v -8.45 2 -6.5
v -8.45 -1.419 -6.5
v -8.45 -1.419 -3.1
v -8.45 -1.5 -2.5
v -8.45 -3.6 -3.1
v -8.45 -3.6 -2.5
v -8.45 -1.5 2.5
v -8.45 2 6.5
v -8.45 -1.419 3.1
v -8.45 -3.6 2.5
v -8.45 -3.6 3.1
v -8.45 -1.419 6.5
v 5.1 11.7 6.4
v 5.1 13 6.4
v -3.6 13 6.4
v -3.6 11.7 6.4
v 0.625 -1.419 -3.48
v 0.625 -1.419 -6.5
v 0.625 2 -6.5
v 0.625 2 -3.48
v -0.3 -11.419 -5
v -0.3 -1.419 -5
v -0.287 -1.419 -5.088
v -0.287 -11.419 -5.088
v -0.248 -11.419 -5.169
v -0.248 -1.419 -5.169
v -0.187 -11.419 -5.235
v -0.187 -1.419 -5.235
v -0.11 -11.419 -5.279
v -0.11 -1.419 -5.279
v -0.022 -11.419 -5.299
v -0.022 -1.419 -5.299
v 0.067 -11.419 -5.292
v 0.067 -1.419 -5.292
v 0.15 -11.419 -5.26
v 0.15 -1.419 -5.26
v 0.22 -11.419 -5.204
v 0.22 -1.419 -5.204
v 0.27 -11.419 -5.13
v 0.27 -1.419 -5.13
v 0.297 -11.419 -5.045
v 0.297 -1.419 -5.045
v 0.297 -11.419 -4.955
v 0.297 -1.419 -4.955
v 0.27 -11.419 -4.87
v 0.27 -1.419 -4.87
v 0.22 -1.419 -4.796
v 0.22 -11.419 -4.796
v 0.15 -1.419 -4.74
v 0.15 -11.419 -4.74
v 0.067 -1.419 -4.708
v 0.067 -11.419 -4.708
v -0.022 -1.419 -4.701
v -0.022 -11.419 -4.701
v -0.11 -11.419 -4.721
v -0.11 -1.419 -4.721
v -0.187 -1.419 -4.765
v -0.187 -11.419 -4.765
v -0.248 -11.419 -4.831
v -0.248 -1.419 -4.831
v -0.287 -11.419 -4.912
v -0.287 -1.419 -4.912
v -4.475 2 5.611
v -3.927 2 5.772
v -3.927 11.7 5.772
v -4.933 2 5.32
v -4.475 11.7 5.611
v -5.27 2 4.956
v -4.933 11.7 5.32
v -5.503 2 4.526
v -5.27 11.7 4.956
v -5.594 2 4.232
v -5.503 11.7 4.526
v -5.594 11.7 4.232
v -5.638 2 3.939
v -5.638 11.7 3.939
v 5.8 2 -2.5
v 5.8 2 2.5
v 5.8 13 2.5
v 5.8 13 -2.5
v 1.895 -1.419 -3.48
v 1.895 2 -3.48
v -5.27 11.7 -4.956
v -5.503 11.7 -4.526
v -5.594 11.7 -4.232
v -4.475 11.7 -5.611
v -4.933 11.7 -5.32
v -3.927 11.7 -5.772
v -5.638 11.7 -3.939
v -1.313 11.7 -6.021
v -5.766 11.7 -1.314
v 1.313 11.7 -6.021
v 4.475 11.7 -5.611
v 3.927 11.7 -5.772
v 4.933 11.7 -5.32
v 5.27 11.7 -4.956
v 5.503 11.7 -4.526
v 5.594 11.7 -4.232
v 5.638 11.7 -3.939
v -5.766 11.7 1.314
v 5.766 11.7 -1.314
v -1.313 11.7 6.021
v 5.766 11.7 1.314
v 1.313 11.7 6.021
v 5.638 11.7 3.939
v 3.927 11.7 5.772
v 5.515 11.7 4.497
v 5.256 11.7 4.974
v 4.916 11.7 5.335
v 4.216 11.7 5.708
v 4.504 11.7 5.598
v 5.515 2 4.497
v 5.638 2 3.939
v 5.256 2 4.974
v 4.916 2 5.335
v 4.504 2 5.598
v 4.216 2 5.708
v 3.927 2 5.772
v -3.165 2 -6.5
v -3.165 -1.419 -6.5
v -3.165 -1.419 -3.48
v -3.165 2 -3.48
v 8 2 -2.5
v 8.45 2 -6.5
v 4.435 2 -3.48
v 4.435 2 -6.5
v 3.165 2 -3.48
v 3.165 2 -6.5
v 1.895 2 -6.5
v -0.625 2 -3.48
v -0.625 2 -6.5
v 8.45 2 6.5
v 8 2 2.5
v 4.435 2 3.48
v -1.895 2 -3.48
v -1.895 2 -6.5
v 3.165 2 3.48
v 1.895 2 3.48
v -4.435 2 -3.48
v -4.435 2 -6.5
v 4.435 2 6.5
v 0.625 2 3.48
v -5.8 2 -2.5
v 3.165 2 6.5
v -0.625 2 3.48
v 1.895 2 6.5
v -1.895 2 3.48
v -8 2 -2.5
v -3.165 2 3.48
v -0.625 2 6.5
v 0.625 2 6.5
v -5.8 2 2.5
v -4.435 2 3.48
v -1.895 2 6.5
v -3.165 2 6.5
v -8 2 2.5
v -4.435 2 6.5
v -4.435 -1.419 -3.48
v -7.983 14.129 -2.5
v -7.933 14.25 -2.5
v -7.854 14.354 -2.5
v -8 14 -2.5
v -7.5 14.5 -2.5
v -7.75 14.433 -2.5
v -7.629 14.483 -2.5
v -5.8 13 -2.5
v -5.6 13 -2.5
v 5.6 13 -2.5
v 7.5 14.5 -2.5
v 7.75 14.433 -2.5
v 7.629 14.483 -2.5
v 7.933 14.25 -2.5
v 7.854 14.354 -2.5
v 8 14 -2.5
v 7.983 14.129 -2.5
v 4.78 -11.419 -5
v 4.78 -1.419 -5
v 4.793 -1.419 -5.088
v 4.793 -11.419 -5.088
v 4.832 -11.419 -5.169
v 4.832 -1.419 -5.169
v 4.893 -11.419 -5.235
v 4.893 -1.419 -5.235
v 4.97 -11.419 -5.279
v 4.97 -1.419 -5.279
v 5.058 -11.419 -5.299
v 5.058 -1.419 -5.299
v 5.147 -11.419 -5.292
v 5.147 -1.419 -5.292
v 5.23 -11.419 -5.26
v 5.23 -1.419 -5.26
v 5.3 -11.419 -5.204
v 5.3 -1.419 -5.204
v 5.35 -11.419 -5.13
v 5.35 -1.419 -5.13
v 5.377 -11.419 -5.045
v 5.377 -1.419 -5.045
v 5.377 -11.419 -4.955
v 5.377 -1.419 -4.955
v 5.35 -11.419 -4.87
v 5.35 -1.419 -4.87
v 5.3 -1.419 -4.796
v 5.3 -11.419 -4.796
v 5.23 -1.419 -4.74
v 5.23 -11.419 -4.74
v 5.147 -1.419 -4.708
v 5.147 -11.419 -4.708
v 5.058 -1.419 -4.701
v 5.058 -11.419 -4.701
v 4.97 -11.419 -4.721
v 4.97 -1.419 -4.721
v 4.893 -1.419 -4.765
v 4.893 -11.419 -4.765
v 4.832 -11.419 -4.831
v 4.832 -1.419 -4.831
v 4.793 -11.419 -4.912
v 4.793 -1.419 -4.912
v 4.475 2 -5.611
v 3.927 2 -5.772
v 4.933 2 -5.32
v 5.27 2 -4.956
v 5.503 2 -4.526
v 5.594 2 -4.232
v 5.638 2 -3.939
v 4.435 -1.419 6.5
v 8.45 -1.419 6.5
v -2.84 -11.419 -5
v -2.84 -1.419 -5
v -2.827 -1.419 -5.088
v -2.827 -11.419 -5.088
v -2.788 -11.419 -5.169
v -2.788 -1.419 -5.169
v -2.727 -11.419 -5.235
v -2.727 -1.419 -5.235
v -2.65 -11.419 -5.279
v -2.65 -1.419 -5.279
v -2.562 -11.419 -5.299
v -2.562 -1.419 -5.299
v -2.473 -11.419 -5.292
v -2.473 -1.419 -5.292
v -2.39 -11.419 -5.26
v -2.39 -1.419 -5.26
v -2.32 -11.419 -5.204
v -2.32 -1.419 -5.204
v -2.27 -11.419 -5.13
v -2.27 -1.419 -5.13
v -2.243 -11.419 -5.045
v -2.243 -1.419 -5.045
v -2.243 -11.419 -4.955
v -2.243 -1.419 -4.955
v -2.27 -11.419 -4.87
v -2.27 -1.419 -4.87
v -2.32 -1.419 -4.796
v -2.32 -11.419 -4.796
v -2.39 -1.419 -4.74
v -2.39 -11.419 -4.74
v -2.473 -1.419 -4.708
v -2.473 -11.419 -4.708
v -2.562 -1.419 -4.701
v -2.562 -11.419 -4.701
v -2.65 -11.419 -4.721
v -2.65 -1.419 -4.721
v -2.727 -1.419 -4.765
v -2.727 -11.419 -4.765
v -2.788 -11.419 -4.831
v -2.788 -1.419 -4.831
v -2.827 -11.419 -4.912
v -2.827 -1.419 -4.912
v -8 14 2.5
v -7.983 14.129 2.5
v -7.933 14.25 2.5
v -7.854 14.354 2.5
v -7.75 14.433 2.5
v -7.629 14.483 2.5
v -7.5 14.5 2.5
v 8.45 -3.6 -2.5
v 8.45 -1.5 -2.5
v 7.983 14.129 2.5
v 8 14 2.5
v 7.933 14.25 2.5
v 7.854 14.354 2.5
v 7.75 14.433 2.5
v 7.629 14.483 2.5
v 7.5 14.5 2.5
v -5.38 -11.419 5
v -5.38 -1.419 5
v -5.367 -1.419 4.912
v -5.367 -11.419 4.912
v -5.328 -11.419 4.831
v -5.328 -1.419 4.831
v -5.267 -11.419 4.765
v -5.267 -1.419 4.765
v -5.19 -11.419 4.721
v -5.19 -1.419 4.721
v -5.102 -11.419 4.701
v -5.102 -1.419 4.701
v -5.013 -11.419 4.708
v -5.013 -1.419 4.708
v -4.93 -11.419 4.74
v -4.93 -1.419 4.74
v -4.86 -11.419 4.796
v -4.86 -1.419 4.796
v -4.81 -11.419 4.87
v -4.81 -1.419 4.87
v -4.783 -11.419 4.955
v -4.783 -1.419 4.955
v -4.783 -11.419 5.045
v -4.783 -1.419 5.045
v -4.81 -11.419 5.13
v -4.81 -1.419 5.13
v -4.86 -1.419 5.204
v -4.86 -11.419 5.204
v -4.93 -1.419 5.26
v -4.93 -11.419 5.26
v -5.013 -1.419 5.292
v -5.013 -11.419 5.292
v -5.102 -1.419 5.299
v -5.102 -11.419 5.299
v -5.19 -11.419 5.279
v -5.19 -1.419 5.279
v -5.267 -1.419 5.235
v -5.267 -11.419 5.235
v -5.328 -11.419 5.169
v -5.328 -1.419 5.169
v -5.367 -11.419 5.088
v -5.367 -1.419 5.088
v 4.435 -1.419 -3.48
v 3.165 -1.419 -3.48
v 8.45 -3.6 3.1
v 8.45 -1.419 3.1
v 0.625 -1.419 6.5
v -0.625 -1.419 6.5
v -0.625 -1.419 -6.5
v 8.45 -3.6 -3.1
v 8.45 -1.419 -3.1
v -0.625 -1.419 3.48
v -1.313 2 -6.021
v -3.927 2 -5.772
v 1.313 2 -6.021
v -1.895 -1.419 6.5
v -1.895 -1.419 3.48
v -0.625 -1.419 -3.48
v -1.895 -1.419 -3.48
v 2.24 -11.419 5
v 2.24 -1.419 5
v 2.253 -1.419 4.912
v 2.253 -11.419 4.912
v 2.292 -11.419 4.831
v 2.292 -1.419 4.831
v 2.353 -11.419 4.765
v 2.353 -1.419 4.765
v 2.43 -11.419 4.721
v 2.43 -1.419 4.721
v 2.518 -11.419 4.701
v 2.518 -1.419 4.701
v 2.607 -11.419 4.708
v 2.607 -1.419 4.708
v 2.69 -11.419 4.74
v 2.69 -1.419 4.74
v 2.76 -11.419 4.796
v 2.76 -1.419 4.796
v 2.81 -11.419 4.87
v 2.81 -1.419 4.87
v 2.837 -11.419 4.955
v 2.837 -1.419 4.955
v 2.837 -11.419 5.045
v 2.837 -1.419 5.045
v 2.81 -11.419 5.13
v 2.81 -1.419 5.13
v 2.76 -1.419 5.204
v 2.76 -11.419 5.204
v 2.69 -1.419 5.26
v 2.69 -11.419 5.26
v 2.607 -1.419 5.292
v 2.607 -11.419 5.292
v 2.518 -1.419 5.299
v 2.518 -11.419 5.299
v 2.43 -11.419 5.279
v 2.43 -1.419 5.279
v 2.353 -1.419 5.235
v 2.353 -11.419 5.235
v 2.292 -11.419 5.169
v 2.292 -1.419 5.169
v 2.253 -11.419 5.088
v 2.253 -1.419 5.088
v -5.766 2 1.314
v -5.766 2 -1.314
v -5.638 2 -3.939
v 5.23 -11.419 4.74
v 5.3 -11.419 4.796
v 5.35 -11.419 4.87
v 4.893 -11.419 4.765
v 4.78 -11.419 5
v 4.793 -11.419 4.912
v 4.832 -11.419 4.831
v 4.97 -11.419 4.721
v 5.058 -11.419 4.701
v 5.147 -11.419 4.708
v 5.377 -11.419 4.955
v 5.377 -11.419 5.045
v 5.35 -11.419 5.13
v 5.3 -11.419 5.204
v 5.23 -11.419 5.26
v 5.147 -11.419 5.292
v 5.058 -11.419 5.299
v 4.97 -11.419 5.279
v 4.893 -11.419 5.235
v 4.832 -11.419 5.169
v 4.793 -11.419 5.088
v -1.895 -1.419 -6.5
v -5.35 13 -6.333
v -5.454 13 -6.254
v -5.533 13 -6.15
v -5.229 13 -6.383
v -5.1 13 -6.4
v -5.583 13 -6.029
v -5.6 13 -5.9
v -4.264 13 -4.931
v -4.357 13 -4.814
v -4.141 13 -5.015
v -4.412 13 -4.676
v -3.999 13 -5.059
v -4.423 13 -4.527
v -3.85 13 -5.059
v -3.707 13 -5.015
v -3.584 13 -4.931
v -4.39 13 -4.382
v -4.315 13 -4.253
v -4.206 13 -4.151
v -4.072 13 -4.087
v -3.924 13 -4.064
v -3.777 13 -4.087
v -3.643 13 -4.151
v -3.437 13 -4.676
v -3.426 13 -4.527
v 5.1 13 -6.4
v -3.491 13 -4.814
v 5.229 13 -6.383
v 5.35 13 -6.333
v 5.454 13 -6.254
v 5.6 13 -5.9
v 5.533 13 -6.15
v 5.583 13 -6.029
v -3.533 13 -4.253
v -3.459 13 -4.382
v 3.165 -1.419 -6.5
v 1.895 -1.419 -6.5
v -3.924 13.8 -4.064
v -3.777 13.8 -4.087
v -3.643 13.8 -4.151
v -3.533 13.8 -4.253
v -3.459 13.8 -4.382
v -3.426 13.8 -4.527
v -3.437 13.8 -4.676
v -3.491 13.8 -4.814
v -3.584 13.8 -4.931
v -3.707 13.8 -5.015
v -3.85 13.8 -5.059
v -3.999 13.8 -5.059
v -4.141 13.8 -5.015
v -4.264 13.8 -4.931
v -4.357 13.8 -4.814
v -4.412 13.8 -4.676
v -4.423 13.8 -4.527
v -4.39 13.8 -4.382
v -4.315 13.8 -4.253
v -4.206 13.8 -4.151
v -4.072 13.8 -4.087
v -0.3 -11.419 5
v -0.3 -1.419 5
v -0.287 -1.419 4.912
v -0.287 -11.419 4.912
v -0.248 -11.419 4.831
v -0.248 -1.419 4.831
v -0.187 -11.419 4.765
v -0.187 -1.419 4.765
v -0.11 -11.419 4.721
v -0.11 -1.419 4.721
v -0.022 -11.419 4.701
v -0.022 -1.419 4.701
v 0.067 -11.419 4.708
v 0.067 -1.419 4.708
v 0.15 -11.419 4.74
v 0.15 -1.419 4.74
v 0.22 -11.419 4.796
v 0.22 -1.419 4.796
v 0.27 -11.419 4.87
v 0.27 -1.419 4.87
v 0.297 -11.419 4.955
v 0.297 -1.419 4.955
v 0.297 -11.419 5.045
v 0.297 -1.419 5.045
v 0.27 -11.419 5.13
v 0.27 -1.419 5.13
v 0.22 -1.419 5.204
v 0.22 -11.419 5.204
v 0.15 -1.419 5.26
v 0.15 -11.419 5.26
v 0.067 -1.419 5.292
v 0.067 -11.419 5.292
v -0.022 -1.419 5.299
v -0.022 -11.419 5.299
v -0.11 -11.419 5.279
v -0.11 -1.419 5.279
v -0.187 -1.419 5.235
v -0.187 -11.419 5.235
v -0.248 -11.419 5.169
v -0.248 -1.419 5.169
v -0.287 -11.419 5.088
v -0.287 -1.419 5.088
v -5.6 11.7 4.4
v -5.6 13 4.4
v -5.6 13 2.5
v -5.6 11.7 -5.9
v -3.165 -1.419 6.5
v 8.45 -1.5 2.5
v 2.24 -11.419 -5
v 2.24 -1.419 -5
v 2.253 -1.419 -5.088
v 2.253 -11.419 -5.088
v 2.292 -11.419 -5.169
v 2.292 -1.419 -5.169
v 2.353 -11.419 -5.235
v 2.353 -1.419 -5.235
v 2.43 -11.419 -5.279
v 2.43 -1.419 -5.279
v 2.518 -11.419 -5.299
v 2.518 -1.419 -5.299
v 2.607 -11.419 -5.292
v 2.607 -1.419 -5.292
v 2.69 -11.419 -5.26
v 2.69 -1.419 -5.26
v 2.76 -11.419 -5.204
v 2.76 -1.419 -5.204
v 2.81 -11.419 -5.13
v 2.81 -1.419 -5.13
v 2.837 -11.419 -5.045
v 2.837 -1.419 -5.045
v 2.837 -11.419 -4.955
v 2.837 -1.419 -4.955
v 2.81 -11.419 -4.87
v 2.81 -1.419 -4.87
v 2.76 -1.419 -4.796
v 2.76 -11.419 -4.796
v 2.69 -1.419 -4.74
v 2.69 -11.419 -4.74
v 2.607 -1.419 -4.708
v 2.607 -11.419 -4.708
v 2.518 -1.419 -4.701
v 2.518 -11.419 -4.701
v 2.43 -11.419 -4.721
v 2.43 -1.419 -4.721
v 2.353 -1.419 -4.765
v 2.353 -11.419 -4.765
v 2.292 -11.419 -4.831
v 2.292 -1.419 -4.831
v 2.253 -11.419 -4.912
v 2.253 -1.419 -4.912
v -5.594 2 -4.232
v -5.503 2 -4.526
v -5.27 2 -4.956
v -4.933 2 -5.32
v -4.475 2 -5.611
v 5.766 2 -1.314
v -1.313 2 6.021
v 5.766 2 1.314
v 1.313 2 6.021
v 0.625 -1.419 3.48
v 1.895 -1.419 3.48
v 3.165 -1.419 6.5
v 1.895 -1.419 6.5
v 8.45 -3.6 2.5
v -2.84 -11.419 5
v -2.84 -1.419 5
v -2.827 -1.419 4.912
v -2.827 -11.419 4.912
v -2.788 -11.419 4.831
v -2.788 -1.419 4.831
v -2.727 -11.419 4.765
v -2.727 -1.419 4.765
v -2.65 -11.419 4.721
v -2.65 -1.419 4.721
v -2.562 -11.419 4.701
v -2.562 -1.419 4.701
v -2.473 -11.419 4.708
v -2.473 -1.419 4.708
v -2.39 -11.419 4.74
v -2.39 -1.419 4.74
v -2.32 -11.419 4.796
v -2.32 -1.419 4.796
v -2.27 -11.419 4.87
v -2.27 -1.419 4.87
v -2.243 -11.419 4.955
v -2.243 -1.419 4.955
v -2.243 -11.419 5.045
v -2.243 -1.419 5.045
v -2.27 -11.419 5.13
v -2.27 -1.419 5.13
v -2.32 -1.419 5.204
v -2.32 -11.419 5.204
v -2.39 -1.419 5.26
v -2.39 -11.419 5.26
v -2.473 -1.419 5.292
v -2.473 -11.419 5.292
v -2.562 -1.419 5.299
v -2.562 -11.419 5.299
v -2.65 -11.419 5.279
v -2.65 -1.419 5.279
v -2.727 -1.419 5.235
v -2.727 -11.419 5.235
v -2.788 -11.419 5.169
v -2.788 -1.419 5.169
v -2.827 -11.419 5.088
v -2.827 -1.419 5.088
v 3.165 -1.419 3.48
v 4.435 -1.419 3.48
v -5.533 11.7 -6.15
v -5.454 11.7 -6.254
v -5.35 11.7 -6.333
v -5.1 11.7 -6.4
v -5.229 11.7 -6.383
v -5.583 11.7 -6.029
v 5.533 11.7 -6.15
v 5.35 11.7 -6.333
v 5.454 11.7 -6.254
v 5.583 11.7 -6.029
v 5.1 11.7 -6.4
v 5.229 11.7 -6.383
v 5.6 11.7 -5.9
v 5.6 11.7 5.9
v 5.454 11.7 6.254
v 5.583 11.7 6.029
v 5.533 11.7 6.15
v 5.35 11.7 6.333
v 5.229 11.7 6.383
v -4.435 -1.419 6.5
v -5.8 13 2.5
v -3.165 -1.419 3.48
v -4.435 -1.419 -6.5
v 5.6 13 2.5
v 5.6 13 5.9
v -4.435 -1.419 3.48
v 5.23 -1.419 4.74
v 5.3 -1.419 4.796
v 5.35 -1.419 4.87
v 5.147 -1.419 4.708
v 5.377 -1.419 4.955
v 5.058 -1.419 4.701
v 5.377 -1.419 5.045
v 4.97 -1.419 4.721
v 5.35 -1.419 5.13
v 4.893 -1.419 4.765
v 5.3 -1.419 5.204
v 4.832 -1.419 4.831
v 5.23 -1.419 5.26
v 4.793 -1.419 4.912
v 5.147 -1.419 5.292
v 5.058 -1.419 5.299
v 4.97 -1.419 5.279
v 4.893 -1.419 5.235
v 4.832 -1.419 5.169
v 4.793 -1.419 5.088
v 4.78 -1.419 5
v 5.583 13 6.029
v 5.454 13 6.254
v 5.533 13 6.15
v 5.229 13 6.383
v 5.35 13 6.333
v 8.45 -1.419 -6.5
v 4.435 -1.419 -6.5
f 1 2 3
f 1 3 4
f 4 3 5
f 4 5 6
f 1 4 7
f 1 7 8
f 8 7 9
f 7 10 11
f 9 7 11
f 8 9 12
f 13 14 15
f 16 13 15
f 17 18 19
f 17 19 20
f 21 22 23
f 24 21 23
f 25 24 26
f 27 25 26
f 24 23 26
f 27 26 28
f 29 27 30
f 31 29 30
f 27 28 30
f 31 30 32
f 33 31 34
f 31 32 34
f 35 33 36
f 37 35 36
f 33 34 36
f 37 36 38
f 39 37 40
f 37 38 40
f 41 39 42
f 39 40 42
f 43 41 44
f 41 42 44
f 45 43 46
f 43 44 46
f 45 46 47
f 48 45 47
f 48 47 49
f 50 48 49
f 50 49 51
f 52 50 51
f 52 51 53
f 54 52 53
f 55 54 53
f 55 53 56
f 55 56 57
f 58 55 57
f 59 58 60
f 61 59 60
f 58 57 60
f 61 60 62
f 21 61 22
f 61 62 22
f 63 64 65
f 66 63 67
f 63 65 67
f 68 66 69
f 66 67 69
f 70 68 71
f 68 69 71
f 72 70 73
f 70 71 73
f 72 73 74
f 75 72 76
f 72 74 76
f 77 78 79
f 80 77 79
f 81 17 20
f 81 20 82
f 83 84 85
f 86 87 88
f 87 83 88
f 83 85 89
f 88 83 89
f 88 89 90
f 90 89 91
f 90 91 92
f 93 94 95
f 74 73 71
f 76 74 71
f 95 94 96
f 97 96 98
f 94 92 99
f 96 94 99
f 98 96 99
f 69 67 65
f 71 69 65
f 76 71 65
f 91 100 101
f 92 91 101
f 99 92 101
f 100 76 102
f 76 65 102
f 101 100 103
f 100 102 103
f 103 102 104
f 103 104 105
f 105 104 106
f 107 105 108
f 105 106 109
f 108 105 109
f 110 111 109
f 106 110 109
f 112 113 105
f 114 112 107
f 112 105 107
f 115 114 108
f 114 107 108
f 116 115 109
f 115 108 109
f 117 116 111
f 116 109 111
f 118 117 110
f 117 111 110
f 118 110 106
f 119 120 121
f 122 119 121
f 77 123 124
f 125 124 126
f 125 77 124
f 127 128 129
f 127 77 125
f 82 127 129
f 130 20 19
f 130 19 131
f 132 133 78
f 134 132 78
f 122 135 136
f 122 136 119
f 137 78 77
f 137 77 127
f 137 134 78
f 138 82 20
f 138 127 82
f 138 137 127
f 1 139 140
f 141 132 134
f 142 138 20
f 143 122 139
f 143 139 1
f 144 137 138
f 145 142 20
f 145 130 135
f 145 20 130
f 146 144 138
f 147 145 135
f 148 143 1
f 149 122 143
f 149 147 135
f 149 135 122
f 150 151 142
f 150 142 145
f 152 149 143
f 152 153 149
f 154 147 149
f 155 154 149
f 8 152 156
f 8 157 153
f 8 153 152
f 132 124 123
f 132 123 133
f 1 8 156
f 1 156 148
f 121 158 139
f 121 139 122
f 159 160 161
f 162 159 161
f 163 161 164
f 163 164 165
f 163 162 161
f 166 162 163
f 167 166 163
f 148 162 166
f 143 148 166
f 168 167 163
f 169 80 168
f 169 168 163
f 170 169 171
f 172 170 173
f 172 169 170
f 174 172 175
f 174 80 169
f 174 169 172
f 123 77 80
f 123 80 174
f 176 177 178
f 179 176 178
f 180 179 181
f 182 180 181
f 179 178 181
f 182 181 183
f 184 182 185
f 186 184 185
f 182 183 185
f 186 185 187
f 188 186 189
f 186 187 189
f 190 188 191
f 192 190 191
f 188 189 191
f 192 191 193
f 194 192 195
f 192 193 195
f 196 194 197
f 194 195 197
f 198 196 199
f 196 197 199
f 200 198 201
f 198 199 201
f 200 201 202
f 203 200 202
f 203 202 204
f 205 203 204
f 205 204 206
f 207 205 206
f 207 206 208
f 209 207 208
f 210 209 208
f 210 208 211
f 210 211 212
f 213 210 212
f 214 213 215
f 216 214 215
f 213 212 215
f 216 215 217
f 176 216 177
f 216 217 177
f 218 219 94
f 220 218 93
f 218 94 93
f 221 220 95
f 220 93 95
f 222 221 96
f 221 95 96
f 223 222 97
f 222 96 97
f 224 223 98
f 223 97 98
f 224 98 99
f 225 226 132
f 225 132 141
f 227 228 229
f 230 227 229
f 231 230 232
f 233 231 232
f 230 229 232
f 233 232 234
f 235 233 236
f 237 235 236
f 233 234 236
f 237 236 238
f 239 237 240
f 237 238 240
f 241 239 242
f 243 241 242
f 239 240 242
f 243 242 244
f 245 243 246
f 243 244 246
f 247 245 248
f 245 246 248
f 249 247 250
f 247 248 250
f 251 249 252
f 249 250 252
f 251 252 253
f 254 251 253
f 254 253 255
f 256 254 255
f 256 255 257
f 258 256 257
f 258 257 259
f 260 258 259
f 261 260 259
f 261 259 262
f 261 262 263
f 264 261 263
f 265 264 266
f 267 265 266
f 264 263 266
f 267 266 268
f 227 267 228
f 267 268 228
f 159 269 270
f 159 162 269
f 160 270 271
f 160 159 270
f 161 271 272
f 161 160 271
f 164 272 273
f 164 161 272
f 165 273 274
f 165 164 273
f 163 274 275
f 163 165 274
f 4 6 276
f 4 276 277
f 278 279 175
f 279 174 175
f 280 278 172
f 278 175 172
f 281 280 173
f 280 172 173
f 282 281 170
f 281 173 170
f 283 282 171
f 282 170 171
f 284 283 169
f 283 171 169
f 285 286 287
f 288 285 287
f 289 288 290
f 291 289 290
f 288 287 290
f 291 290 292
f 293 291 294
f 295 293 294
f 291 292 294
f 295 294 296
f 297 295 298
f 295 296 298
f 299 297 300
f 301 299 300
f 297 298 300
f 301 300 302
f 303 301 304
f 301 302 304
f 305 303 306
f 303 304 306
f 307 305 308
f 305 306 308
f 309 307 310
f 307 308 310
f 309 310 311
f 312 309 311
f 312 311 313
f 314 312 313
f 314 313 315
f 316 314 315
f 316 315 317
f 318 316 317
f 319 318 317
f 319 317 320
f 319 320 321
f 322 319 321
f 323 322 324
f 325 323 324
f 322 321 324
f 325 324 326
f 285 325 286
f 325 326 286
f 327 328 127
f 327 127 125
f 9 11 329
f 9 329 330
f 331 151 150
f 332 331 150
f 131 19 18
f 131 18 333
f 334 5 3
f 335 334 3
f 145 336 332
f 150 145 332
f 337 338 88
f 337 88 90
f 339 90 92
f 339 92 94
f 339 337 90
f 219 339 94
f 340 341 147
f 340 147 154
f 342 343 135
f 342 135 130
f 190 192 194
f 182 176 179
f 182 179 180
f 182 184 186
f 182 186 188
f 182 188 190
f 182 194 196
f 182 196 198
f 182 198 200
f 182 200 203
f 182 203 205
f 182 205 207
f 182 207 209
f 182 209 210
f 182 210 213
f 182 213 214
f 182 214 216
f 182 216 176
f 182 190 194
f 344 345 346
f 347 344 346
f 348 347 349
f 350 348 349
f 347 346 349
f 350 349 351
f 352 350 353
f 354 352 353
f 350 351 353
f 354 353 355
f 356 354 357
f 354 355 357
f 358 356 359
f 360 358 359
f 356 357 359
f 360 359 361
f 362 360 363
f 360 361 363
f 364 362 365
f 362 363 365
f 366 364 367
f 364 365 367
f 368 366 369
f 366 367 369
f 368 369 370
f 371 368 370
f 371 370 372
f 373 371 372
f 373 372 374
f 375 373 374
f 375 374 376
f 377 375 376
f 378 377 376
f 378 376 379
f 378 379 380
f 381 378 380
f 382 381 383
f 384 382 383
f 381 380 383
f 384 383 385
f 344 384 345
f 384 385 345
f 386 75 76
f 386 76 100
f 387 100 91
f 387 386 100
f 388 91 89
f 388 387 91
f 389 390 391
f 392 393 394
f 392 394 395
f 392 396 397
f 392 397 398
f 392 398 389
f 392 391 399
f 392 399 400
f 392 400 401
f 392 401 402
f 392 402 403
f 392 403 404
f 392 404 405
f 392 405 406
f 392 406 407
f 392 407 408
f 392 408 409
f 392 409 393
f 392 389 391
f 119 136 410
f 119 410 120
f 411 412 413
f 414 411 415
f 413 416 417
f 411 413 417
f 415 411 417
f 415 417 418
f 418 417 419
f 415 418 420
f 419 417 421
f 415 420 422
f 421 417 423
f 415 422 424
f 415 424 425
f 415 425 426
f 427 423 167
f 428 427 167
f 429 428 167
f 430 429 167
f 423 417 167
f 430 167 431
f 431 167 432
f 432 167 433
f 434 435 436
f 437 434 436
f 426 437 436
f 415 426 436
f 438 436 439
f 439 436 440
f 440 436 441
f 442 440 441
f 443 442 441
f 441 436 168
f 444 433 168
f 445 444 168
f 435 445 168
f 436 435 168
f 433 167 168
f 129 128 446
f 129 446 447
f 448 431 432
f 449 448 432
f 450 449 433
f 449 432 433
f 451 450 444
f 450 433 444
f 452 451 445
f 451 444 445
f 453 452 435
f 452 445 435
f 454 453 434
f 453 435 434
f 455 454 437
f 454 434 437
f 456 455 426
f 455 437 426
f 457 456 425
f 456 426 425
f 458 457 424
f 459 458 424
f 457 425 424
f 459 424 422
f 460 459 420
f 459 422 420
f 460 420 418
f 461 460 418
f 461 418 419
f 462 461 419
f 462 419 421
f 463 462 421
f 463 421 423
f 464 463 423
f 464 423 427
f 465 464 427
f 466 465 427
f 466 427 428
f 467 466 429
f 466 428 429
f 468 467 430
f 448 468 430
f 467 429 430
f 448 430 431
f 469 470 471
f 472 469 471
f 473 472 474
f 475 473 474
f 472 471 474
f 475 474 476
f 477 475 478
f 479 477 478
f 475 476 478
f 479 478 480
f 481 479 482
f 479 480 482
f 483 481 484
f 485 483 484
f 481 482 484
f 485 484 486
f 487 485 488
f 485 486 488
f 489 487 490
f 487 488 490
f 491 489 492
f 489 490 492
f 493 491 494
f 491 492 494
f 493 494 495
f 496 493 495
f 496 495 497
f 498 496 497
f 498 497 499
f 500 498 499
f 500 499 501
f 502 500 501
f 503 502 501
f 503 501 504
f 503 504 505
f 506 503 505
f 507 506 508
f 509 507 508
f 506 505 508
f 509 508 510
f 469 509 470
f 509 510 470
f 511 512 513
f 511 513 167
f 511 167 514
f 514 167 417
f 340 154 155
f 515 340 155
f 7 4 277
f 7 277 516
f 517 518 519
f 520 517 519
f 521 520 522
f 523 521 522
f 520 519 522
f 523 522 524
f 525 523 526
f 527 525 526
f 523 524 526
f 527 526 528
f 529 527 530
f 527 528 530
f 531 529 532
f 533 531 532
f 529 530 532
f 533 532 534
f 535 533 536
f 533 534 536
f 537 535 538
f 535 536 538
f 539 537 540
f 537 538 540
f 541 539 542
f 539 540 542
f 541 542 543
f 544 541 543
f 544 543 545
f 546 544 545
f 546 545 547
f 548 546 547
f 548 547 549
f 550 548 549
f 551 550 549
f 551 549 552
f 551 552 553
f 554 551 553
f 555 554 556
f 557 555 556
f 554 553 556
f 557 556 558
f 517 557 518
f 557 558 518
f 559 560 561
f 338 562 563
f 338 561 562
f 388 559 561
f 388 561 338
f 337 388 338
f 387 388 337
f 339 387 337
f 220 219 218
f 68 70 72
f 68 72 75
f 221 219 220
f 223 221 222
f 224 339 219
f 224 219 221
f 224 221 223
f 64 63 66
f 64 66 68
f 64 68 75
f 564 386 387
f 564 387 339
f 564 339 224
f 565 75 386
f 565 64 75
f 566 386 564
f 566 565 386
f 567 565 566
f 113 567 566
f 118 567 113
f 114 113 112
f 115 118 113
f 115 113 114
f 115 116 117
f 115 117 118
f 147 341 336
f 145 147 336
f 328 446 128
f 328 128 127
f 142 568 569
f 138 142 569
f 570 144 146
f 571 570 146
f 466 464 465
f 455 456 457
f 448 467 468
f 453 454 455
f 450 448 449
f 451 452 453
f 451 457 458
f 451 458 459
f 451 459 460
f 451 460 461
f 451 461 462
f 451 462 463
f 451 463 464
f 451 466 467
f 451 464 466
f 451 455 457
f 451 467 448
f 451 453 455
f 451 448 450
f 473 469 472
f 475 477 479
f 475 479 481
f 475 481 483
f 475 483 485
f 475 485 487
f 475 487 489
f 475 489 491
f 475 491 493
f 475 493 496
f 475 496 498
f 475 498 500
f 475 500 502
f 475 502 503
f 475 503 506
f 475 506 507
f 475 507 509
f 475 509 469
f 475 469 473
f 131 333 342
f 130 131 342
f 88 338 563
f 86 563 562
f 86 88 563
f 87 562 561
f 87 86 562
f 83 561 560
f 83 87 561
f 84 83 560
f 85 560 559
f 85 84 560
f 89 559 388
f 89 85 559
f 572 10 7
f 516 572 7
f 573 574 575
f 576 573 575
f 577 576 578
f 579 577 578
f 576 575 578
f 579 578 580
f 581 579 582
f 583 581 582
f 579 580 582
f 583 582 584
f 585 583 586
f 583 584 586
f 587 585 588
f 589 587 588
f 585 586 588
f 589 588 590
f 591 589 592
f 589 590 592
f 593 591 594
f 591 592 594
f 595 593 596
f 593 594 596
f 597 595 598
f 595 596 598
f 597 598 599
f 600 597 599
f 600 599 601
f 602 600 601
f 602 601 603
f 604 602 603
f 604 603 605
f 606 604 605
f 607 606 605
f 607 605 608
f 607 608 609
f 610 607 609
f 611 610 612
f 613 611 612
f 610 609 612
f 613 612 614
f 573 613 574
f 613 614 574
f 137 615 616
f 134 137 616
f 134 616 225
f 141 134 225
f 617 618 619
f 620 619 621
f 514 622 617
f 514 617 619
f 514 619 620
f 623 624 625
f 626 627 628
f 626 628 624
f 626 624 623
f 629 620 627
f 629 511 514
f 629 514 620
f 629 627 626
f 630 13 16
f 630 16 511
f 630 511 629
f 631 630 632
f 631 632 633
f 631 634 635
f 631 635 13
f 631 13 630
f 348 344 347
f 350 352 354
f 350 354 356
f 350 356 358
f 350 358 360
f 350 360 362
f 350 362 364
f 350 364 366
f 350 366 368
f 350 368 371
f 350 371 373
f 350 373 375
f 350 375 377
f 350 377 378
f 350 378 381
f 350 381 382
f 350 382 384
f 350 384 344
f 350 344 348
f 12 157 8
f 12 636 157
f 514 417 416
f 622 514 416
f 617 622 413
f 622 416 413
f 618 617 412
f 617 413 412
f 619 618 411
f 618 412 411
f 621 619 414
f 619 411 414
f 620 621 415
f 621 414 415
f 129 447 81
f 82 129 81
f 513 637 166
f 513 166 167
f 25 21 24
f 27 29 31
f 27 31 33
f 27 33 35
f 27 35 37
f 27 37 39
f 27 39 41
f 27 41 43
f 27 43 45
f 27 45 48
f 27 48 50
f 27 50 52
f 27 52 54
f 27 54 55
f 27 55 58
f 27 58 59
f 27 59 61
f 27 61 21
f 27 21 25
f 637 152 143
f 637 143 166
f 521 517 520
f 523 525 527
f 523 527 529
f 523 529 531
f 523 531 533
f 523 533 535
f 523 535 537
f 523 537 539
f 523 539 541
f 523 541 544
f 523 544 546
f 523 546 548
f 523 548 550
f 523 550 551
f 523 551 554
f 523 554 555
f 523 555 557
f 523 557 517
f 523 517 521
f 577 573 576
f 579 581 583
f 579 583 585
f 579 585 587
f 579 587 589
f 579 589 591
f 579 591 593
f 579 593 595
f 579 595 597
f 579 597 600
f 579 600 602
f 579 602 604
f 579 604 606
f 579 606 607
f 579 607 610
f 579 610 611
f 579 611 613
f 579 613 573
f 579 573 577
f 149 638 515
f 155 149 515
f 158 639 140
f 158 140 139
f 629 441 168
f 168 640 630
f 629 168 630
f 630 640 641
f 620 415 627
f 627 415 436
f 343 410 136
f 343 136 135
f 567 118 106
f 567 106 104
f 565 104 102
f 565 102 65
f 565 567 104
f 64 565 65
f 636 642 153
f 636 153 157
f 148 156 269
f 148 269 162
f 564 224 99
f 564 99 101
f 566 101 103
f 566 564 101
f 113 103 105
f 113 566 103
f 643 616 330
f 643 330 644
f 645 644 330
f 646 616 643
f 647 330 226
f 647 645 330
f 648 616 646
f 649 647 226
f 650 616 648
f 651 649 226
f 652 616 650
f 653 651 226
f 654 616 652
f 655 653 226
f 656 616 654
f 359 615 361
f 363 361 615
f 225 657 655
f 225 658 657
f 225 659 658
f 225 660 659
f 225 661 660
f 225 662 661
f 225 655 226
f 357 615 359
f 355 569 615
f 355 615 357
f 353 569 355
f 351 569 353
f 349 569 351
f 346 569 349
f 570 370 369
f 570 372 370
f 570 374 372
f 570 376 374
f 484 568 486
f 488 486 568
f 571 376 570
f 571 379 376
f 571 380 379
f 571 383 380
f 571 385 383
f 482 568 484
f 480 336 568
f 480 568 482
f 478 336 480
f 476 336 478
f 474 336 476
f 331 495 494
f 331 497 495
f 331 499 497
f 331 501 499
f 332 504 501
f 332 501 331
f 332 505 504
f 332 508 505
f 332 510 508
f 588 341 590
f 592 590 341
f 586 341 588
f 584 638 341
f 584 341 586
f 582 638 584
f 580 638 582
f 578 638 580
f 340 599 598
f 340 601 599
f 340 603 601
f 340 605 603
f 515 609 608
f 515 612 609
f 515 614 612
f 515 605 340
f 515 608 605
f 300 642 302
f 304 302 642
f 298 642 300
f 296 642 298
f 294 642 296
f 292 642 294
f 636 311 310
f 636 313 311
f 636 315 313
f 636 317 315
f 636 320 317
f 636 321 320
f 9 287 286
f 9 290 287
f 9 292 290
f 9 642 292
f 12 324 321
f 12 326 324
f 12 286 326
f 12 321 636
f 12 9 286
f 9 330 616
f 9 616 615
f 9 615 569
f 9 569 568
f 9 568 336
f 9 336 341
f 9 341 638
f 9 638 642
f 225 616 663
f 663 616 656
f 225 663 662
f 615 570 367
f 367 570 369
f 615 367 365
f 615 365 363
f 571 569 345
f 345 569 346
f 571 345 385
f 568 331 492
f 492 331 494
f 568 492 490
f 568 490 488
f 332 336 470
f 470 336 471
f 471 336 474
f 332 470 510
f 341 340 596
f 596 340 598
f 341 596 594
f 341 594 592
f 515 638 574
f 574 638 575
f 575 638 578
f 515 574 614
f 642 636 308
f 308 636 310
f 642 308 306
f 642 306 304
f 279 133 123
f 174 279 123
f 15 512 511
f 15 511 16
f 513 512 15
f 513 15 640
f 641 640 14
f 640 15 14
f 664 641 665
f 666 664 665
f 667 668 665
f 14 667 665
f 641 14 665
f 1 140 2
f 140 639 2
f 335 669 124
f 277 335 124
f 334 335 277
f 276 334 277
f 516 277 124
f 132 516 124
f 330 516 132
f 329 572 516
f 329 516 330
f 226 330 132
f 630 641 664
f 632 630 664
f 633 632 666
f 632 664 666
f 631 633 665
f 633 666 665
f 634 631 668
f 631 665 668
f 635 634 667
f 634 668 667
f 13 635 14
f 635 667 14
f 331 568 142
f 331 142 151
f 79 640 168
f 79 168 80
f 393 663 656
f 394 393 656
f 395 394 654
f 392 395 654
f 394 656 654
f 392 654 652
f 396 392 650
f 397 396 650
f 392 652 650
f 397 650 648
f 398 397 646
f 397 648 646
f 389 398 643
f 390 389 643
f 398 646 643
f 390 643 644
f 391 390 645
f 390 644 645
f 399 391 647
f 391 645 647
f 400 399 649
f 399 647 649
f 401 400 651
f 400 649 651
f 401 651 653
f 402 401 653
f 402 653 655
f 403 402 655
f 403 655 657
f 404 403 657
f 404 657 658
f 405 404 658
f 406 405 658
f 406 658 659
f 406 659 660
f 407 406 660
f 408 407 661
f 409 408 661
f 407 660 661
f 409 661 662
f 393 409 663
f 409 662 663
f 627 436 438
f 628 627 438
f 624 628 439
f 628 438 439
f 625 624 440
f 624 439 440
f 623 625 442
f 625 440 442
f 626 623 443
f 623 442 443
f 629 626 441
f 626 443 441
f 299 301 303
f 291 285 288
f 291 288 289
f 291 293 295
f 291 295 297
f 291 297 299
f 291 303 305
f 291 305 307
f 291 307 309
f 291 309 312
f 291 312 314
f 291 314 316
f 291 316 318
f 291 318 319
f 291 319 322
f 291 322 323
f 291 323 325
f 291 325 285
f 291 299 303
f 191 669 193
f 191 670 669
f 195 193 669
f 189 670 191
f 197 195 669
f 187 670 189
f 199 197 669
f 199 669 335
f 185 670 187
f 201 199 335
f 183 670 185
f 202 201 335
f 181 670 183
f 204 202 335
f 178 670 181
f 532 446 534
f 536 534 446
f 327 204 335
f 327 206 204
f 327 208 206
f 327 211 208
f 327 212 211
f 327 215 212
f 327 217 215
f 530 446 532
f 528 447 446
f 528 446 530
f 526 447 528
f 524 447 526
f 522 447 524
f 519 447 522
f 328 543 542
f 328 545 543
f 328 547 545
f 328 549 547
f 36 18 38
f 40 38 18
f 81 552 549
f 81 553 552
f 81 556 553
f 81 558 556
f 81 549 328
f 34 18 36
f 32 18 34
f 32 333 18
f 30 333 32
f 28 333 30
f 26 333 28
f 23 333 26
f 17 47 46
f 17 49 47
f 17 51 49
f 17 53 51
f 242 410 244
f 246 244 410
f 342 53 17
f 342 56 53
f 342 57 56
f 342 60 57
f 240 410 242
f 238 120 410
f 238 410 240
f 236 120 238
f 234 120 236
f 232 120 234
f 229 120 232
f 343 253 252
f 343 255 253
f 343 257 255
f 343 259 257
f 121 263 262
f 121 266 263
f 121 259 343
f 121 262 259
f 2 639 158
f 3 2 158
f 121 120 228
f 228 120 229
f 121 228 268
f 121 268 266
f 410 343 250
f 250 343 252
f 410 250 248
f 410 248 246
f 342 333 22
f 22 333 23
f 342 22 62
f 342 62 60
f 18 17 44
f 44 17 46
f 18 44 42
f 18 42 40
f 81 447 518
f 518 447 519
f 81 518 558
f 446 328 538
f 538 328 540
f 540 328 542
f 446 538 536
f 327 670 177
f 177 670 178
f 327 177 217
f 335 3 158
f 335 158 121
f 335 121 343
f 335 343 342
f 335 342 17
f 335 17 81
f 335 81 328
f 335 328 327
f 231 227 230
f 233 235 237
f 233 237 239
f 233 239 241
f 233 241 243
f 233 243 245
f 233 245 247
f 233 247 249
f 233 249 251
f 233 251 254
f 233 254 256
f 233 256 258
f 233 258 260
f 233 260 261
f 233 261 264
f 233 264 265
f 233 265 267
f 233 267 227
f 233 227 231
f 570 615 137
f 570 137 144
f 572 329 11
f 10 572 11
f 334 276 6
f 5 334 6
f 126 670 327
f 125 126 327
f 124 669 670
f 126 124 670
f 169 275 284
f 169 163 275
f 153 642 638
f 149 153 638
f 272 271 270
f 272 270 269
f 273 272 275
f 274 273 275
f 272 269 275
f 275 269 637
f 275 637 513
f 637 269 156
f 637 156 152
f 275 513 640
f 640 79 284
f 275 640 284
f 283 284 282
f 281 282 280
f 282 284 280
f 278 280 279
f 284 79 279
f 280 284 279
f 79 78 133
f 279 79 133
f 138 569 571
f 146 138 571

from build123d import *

# Parameters (mm, degrees)
SKETCH_2_W              = 16
SKETCH_2_H              = 5
EXTRUDE_1_DEPTH         = 14.5
SKETCH_3_W              = 11.6
SKETCH_3_H              = 11.5
CUT_EXTRUDE_2_DEPTH     = 18.298843892
EXTRUDE_3_DEPTH         = 1.3
EXTRUDE_7_DEPTH         = 0.5
EXTRUDE_7_DEPTH_BACK    = 5.1
SKETCH_6_W              = 16.9
SKETCH_6_H              = 13
CORTAR_EXTRUIR1_REACH   = 25.197
CROQUIS1_W              = 5
CROQUIS1_H              = 2.618972118
CROQUIS1_W_2            = 4.180401644
CROQUIS1_H_2            = 2.699558885
CROQUIS1_W_3            = 4.970986267
CUT_EXTRUDE_10_REACH    = 21.728
EXTRUDE_19_DEPTH        = 9.7
FILLET_1_R              = 2
REDONDEO1_R             = 0.5
SKETCH_19_R             = 0.5
EXTRUDE_20_DEPTH        = 0.8
CROQUIS2_W              = 1.27
CROQUIS2_H              = 3.5
CORTAR_EXTRUIR2_DEPTH   = 3.419413
CROQUIS3_R              = 0.3
SALIENTE_EXTRUIR1_DEPTH = 10


with BuildPart() as part:
    # Эскиз2 → Вытянуть1 (new body)
    with BuildSketch(Plane(origin=(0, 0, 0), x_dir=(1, 0, 0), z_dir=(0, 1, 0))):
        Rectangle(SKETCH_2_W, SKETCH_2_H)
    extrude(amount=EXTRUDE_1_DEPTH)

    # Эскиз3 → Вытянуть2 (cut, through all)
    with BuildSketch(Plane.XY.offset(2.5)):
        with Locations((0, 7.25)):
            Rectangle(SKETCH_3_W, SKETCH_3_H)
    extrude(amount=-CUT_EXTRUDE_2_DEPTH, mode=Mode.SUBTRACT)

    # Эскиз4 → Вытянуть3 (add)
    with BuildSketch(Plane.XZ.offset(-13)):
        with BuildLine():
            Line((-5.1, -6.4), (5.1, -6.4))
            ThreePointArc((5.1, -6.4), (5.453553391, -6.253553391), (5.6, -5.9))
            Line((5.6, -5.9), (5.6, 5.9))
            ThreePointArc((5.6, 5.9), (5.453553391, 6.253553391), (5.1, 6.4))
            Line((5.1, 6.4), (-5.6, 6.4))
            Line((-5.6, 6.4), (-5.6, -5.9))
            ThreePointArc((-5.6, -5.9), (-5.453553391, -6.253553391), (-5.1, -6.4))
        make_face()
    extrude(amount=EXTRUDE_3_DEPTH)

    # Эскиз6 → Вытянуть7 (add, two sides: drawn at the far end of the back side and taken through both)
    with BuildSketch(Plane(origin=(0, 1.5, 0), x_dir=(-1, 0, 0), z_dir=(0, 1, 0)).offset(-EXTRUDE_7_DEPTH_BACK)):
        Rectangle(SKETCH_6_W, SKETCH_6_H)
    extrude(amount=EXTRUDE_7_DEPTH + EXTRUDE_7_DEPTH_BACK)

    # Croquis1 → Cortar-Extruir1 (cut, up to next)
    with BuildSketch(Plane.ZY.offset(8.45), mode=Mode.PRIVATE) as cortar_extruir1_sk1:
        with Locations((0, -2.809486059)):
            Rectangle(CROQUIS1_W, CROQUIS1_H)
    cortar_extruir1_tool1 = extrude(cortar_extruir1_sk1.sketch, amount=-CORTAR_EXTRUIR1_REACH, mode=Mode.PRIVATE) & part.part
    # Croquis1 → Cortar-Extruir1 (cut, up to next)
    with BuildSketch(Plane.ZY.offset(8.45), mode=Mode.PRIVATE) as cortar_extruir1_sk2:
        with Locations((5.190200822, -2.769192676)):
            Rectangle(CROQUIS1_W_2, CROQUIS1_H_2)
    cortar_extruir1_tool2 = extrude(cortar_extruir1_sk2.sketch, amount=-CORTAR_EXTRUIR1_REACH, mode=Mode.PRIVATE) & part.part
    # Croquis1 → Cortar-Extruir1 (cut, up to next)
    with BuildSketch(Plane.ZY.offset(8.45), mode=Mode.PRIVATE) as cortar_extruir1_sk3:
        with Locations((-5.585493133, -2.769192676)):
            Rectangle(CROQUIS1_W_3, CROQUIS1_H_2)
    cortar_extruir1_tool3 = extrude(cortar_extruir1_sk3.sketch, amount=-CORTAR_EXTRUIR1_REACH, mode=Mode.PRIVATE) & part.part
    add(cortar_extruir1_tool1.solids().sort_by_distance((-8.45, -2.809486, 0))[0], mode=Mode.SUBTRACT)
    add(cortar_extruir1_tool2.solids().sort_by_distance((-8.45, -2.769193, 5.190201))[0], mode=Mode.SUBTRACT)
    add(cortar_extruir1_tool3.solids().sort_by_distance((-8.45, -2.769193, -5.585493))[0], mode=Mode.SUBTRACT)

    # Эскиз11 → Вытянуть10 (cut, up to next)
    with BuildSketch(Plane(origin=(0, 13, 0), x_dir=(-1, 0, 0), z_dir=(0, 1, 0)), mode=Mode.PRIVATE) as cut_extrude_10_sk1:
        Polygon((5.6, 4.4), (3.6, 6.4), (5.6, 6.4), align=None)
    cut_extrude_10_tool1 = extrude(cut_extrude_10_sk1.sketch, amount=-CUT_EXTRUDE_10_REACH, mode=Mode.PRIVATE) & part.part
    add(cut_extrude_10_tool1.solids().sort_by_distance((-4.933333, 13, 5.733333))[0], mode=Mode.SUBTRACT)

    # Redondeo1
    redondeo1_edges = [part.edges().sort_by_distance(p)[0] for p in [
        (-8, 14.5, 0),
        (8, 14.5, 0),
    ]]
    fillet(redondeo1_edges, radius=REDONDEO1_R)

    # Эскиз19 → Вытянуть20 (add)
    with BuildSketch(Plane(origin=(0, 13, 0), x_dir=(-1, 0, 0), z_dir=(0, 1, 0))):
        with Locations(Location((3.924240872, -4.564485884, 0), (0, 0, 90))):
            Circle(SKETCH_19_R)
    extrude(amount=EXTRUDE_20_DEPTH)

    # Croquis2 → Cortar-Extruir2 (cut)
    with BuildSketch(Plane.XZ.offset(1.419413233)):
        with Locations((1.26, -5.230358176)):
            Rectangle(CROQUIS2_W, CROQUIS2_H)
        with Locations((-1.26, -5.230358176)):
            Rectangle(CROQUIS2_W, CROQUIS2_H)
        with Locations((-3.8, -5.230358176)):
            Rectangle(CROQUIS2_W, CROQUIS2_H)
        with Locations((3.8, -5.230358176)):
            Rectangle(CROQUIS2_W, CROQUIS2_H)
        with Locations((3.8, 5.230358176)):
            Rectangle(CROQUIS2_W, CROQUIS2_H)
        with Locations((1.26, 5.230358176)):
            Rectangle(CROQUIS2_W, CROQUIS2_H)
        with Locations((-1.26, 5.230358176)):
            Rectangle(CROQUIS2_W, CROQUIS2_H)
        with Locations((-3.8, 5.230358176)):
            Rectangle(CROQUIS2_W, CROQUIS2_H)
    extrude(amount=-CORTAR_EXTRUIR2_DEPTH, mode=Mode.SUBTRACT)

    # Croquis3 → Saliente-Extruir1 (add)
    with BuildSketch(Plane.XZ.offset(1.419413233)):
        with Locations(Location((0, 5, 0), (0, 0, 180))):
            Circle(CROQUIS3_R)
        with Locations(Location((2.54, 5, 0), (0, 0, 180))):
            Circle(CROQUIS3_R)
        with Locations(Location((5.08, 5, 0), (0, 0, 180))):
            Circle(CROQUIS3_R)
        with Locations(Location((-2.54, 5, 0), (0, 0, 180))):
            Circle(CROQUIS3_R)
        with Locations(Location((-5.08, 5, 0), (0, 0, 180))):
            Circle(CROQUIS3_R)
        with Locations(Location((5.08, -5, 0), (0, 0, 180))):
            Circle(CROQUIS3_R)
        with Locations(Location((2.54, -5, 0), (0, 0, 180))):
            Circle(CROQUIS3_R)
        with Locations(Location((0, -5, 0), (0, 0, 180))):
            Circle(CROQUIS3_R)
        with Locations(Location((-2.54, -5, 0), (0, 0, 180))):
            Circle(CROQUIS3_R)
    extrude(amount=SALIENTE_EXTRUIR1_DEPTH)


with BuildPart() as body_2:
    # Эскиз18 → Вытянуть19 (new body)
    with BuildSketch(Plane(origin=(0, 2, 0), x_dir=(-1, 0, 0), z_dir=(0, 1, 0))):
        with BuildLine():
            ThreePointArc((5.5, -5.5), (0, -6.052149071), (-5.5, -5.5))
            ThreePointArc((-5.5, -5.5), (-5.781967238, 0), (-5.5, 5.5))
            ThreePointArc((-5.5, 5.5), (0, 6.052149071), (5.5, 5.5))
            ThreePointArc((5.5, 5.5), (5.781967238, 0), (5.5, -5.5))
        make_face()
    extrude(amount=EXTRUDE_19_DEPTH)

    # Скругление1
    fillet_1_edges = [body_2.edges().sort_by_distance(p)[0] for p in [
        (-5.5, 6.85, 5.5),
        (-5.5, 6.85, -5.5),
        (5.5, 6.85, -5.5),
        (5.5, 6.85, 5.5),
    ]]
    fillet(fillet_1_edges, radius=FILLET_1_R)


solid = Compound([part.part, body_2.part])
